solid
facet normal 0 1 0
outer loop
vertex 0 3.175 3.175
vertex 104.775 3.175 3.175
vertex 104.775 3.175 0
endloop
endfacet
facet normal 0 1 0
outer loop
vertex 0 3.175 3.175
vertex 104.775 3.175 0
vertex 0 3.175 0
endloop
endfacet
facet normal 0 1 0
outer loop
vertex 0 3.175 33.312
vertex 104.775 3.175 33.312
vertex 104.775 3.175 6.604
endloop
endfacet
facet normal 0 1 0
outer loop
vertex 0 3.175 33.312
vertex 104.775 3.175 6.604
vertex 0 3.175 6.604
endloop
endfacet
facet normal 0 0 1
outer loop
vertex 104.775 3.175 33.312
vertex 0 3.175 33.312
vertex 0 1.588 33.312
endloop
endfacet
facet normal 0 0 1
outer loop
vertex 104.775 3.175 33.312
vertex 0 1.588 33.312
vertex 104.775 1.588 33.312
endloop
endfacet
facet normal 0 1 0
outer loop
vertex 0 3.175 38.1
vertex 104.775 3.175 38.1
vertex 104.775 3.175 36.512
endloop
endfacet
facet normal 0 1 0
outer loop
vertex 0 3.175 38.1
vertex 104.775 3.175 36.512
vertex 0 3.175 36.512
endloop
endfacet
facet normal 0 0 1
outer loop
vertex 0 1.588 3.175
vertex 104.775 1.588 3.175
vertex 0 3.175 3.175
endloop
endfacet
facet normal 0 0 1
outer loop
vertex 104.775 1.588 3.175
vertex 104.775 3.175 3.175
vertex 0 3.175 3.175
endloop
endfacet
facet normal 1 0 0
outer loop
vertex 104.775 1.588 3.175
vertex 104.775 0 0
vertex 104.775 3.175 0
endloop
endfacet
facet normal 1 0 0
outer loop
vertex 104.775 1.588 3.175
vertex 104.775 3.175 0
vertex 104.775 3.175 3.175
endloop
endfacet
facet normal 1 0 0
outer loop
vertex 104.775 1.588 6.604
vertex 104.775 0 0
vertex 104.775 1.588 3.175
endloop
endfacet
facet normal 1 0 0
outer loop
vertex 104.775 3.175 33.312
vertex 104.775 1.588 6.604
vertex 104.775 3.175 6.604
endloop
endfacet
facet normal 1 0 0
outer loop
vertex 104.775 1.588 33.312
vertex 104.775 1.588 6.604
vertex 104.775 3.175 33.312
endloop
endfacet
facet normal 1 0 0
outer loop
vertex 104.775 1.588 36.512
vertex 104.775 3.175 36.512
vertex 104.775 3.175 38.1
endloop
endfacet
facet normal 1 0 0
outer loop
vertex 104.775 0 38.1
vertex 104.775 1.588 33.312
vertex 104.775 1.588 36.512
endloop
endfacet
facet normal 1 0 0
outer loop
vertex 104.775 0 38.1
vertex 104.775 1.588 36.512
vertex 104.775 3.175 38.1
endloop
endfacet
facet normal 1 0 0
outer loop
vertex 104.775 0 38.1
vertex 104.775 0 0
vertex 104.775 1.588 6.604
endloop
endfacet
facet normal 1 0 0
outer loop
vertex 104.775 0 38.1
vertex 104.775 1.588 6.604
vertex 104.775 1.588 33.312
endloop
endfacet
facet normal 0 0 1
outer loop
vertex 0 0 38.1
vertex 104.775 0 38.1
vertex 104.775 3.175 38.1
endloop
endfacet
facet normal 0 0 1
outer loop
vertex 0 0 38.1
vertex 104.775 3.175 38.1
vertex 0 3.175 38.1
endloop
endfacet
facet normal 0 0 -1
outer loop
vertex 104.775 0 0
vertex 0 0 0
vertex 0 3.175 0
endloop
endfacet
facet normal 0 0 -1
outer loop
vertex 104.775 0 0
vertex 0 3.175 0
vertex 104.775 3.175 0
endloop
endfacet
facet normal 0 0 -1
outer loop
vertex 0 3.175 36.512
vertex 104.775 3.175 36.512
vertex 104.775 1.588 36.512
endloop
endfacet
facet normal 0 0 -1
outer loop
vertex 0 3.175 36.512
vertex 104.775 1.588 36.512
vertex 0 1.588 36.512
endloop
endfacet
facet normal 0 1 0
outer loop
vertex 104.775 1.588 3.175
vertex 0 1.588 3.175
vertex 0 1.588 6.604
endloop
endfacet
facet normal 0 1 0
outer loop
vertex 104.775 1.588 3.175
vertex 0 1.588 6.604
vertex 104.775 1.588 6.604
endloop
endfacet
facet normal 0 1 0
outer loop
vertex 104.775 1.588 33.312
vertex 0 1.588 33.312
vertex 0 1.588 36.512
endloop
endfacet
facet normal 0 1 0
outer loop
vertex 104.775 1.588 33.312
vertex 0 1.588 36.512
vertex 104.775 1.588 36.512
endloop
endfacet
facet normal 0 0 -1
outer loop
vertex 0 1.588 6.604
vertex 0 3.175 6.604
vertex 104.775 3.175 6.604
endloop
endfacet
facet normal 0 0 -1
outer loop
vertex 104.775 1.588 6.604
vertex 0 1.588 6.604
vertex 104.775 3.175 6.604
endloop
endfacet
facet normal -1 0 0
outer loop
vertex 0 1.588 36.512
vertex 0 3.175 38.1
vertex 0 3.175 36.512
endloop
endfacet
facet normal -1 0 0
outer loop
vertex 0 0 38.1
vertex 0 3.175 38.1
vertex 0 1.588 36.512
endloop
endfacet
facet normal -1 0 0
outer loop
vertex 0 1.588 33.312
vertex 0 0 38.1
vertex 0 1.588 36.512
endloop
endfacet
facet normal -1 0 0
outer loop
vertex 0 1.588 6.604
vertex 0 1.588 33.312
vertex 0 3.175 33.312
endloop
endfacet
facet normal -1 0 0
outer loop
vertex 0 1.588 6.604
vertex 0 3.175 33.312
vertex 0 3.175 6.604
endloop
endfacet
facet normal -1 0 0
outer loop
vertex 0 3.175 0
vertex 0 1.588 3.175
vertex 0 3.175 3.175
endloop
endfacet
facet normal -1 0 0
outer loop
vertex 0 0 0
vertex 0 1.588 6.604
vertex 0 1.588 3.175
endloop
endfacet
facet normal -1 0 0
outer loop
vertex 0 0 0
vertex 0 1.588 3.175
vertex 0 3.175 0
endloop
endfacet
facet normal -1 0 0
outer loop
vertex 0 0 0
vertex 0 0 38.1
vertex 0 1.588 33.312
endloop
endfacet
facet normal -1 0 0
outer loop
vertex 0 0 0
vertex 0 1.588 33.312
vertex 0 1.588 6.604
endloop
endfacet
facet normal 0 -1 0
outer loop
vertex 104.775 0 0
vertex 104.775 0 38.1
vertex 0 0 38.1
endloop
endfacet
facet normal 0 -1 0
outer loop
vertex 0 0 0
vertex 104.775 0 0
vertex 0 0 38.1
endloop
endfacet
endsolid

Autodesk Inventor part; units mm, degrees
ref_plane "YZ Plane" through (0, 0, 0) normal (1, 0, 0) x (0, 1, 0)
ref_plane "XZ Plane" through (0, 0, 0) normal (0, 1, 0) x (-1, 0, 0)
ref_plane "XY Plane" through (0, 0, 0) normal (0, 0, 1) x (1, 0, 0)
sketch "Sketch1" plane through (0, 0, 0) normal (0, 1, 0) x (-1, 0, 0)
  line L0 (0, 0) -> (-104.775, 0)
  line L1 (-104.775, 0) -> (-104.775, 38.1)
  line L2 (-104.775, 38.1) -> (0, 38.1)
  line L3 (0, 38.1) -> (0, 0)
  dimension "d0" = 104.775
  dimension "d1" = 38.1
extrude "Extrusion1" add sketch "Sketch1" along normal blind 3.175
sketch "Sketch2" plane through (0, 3.175, 0) normal (0, 1, 0) x (1, 0, 0)
  line L0 (0, 0) -> (0, -38.1) projected
  line L1 (104.775, -38.1) -> (104.775, 0) projected
  line L2 (0, -33.3121) -> (104.775, -33.3121)
  line L3 (104.775, -33.3121) -> (104.775, -36.5125)
  line L4 (104.775, -36.5125) -> (0, -36.5125)
  line L5 (0, -36.5125) -> (0, -33.3121)
  line L6 (0, -38.1) -> (104.775, -38.1) projected
  line L7 (104.775, 0) -> (0, 0) projected
  line L8 (104.775, -3.175) -> (0, -3.175)
  line L9 (0, -3.175) -> (0, -6.604)
  line L10 (0, -6.604) -> (104.775, -6.604)
  line L11 (104.775, -6.604) -> (104.775, -3.175)
  dimension "d4" = 3.2004
  dimension "d8" = 1.5875
  dimension "d13" = 3.175
  dimension "d14" = 3.429
extrude "Extrusion2" cut sketch "Sketch2" against normal blind 1.5875 contours L8 L1 L10 L0 | L2 L1 L4 L0
properties part number "Electronics Container Part 2"
